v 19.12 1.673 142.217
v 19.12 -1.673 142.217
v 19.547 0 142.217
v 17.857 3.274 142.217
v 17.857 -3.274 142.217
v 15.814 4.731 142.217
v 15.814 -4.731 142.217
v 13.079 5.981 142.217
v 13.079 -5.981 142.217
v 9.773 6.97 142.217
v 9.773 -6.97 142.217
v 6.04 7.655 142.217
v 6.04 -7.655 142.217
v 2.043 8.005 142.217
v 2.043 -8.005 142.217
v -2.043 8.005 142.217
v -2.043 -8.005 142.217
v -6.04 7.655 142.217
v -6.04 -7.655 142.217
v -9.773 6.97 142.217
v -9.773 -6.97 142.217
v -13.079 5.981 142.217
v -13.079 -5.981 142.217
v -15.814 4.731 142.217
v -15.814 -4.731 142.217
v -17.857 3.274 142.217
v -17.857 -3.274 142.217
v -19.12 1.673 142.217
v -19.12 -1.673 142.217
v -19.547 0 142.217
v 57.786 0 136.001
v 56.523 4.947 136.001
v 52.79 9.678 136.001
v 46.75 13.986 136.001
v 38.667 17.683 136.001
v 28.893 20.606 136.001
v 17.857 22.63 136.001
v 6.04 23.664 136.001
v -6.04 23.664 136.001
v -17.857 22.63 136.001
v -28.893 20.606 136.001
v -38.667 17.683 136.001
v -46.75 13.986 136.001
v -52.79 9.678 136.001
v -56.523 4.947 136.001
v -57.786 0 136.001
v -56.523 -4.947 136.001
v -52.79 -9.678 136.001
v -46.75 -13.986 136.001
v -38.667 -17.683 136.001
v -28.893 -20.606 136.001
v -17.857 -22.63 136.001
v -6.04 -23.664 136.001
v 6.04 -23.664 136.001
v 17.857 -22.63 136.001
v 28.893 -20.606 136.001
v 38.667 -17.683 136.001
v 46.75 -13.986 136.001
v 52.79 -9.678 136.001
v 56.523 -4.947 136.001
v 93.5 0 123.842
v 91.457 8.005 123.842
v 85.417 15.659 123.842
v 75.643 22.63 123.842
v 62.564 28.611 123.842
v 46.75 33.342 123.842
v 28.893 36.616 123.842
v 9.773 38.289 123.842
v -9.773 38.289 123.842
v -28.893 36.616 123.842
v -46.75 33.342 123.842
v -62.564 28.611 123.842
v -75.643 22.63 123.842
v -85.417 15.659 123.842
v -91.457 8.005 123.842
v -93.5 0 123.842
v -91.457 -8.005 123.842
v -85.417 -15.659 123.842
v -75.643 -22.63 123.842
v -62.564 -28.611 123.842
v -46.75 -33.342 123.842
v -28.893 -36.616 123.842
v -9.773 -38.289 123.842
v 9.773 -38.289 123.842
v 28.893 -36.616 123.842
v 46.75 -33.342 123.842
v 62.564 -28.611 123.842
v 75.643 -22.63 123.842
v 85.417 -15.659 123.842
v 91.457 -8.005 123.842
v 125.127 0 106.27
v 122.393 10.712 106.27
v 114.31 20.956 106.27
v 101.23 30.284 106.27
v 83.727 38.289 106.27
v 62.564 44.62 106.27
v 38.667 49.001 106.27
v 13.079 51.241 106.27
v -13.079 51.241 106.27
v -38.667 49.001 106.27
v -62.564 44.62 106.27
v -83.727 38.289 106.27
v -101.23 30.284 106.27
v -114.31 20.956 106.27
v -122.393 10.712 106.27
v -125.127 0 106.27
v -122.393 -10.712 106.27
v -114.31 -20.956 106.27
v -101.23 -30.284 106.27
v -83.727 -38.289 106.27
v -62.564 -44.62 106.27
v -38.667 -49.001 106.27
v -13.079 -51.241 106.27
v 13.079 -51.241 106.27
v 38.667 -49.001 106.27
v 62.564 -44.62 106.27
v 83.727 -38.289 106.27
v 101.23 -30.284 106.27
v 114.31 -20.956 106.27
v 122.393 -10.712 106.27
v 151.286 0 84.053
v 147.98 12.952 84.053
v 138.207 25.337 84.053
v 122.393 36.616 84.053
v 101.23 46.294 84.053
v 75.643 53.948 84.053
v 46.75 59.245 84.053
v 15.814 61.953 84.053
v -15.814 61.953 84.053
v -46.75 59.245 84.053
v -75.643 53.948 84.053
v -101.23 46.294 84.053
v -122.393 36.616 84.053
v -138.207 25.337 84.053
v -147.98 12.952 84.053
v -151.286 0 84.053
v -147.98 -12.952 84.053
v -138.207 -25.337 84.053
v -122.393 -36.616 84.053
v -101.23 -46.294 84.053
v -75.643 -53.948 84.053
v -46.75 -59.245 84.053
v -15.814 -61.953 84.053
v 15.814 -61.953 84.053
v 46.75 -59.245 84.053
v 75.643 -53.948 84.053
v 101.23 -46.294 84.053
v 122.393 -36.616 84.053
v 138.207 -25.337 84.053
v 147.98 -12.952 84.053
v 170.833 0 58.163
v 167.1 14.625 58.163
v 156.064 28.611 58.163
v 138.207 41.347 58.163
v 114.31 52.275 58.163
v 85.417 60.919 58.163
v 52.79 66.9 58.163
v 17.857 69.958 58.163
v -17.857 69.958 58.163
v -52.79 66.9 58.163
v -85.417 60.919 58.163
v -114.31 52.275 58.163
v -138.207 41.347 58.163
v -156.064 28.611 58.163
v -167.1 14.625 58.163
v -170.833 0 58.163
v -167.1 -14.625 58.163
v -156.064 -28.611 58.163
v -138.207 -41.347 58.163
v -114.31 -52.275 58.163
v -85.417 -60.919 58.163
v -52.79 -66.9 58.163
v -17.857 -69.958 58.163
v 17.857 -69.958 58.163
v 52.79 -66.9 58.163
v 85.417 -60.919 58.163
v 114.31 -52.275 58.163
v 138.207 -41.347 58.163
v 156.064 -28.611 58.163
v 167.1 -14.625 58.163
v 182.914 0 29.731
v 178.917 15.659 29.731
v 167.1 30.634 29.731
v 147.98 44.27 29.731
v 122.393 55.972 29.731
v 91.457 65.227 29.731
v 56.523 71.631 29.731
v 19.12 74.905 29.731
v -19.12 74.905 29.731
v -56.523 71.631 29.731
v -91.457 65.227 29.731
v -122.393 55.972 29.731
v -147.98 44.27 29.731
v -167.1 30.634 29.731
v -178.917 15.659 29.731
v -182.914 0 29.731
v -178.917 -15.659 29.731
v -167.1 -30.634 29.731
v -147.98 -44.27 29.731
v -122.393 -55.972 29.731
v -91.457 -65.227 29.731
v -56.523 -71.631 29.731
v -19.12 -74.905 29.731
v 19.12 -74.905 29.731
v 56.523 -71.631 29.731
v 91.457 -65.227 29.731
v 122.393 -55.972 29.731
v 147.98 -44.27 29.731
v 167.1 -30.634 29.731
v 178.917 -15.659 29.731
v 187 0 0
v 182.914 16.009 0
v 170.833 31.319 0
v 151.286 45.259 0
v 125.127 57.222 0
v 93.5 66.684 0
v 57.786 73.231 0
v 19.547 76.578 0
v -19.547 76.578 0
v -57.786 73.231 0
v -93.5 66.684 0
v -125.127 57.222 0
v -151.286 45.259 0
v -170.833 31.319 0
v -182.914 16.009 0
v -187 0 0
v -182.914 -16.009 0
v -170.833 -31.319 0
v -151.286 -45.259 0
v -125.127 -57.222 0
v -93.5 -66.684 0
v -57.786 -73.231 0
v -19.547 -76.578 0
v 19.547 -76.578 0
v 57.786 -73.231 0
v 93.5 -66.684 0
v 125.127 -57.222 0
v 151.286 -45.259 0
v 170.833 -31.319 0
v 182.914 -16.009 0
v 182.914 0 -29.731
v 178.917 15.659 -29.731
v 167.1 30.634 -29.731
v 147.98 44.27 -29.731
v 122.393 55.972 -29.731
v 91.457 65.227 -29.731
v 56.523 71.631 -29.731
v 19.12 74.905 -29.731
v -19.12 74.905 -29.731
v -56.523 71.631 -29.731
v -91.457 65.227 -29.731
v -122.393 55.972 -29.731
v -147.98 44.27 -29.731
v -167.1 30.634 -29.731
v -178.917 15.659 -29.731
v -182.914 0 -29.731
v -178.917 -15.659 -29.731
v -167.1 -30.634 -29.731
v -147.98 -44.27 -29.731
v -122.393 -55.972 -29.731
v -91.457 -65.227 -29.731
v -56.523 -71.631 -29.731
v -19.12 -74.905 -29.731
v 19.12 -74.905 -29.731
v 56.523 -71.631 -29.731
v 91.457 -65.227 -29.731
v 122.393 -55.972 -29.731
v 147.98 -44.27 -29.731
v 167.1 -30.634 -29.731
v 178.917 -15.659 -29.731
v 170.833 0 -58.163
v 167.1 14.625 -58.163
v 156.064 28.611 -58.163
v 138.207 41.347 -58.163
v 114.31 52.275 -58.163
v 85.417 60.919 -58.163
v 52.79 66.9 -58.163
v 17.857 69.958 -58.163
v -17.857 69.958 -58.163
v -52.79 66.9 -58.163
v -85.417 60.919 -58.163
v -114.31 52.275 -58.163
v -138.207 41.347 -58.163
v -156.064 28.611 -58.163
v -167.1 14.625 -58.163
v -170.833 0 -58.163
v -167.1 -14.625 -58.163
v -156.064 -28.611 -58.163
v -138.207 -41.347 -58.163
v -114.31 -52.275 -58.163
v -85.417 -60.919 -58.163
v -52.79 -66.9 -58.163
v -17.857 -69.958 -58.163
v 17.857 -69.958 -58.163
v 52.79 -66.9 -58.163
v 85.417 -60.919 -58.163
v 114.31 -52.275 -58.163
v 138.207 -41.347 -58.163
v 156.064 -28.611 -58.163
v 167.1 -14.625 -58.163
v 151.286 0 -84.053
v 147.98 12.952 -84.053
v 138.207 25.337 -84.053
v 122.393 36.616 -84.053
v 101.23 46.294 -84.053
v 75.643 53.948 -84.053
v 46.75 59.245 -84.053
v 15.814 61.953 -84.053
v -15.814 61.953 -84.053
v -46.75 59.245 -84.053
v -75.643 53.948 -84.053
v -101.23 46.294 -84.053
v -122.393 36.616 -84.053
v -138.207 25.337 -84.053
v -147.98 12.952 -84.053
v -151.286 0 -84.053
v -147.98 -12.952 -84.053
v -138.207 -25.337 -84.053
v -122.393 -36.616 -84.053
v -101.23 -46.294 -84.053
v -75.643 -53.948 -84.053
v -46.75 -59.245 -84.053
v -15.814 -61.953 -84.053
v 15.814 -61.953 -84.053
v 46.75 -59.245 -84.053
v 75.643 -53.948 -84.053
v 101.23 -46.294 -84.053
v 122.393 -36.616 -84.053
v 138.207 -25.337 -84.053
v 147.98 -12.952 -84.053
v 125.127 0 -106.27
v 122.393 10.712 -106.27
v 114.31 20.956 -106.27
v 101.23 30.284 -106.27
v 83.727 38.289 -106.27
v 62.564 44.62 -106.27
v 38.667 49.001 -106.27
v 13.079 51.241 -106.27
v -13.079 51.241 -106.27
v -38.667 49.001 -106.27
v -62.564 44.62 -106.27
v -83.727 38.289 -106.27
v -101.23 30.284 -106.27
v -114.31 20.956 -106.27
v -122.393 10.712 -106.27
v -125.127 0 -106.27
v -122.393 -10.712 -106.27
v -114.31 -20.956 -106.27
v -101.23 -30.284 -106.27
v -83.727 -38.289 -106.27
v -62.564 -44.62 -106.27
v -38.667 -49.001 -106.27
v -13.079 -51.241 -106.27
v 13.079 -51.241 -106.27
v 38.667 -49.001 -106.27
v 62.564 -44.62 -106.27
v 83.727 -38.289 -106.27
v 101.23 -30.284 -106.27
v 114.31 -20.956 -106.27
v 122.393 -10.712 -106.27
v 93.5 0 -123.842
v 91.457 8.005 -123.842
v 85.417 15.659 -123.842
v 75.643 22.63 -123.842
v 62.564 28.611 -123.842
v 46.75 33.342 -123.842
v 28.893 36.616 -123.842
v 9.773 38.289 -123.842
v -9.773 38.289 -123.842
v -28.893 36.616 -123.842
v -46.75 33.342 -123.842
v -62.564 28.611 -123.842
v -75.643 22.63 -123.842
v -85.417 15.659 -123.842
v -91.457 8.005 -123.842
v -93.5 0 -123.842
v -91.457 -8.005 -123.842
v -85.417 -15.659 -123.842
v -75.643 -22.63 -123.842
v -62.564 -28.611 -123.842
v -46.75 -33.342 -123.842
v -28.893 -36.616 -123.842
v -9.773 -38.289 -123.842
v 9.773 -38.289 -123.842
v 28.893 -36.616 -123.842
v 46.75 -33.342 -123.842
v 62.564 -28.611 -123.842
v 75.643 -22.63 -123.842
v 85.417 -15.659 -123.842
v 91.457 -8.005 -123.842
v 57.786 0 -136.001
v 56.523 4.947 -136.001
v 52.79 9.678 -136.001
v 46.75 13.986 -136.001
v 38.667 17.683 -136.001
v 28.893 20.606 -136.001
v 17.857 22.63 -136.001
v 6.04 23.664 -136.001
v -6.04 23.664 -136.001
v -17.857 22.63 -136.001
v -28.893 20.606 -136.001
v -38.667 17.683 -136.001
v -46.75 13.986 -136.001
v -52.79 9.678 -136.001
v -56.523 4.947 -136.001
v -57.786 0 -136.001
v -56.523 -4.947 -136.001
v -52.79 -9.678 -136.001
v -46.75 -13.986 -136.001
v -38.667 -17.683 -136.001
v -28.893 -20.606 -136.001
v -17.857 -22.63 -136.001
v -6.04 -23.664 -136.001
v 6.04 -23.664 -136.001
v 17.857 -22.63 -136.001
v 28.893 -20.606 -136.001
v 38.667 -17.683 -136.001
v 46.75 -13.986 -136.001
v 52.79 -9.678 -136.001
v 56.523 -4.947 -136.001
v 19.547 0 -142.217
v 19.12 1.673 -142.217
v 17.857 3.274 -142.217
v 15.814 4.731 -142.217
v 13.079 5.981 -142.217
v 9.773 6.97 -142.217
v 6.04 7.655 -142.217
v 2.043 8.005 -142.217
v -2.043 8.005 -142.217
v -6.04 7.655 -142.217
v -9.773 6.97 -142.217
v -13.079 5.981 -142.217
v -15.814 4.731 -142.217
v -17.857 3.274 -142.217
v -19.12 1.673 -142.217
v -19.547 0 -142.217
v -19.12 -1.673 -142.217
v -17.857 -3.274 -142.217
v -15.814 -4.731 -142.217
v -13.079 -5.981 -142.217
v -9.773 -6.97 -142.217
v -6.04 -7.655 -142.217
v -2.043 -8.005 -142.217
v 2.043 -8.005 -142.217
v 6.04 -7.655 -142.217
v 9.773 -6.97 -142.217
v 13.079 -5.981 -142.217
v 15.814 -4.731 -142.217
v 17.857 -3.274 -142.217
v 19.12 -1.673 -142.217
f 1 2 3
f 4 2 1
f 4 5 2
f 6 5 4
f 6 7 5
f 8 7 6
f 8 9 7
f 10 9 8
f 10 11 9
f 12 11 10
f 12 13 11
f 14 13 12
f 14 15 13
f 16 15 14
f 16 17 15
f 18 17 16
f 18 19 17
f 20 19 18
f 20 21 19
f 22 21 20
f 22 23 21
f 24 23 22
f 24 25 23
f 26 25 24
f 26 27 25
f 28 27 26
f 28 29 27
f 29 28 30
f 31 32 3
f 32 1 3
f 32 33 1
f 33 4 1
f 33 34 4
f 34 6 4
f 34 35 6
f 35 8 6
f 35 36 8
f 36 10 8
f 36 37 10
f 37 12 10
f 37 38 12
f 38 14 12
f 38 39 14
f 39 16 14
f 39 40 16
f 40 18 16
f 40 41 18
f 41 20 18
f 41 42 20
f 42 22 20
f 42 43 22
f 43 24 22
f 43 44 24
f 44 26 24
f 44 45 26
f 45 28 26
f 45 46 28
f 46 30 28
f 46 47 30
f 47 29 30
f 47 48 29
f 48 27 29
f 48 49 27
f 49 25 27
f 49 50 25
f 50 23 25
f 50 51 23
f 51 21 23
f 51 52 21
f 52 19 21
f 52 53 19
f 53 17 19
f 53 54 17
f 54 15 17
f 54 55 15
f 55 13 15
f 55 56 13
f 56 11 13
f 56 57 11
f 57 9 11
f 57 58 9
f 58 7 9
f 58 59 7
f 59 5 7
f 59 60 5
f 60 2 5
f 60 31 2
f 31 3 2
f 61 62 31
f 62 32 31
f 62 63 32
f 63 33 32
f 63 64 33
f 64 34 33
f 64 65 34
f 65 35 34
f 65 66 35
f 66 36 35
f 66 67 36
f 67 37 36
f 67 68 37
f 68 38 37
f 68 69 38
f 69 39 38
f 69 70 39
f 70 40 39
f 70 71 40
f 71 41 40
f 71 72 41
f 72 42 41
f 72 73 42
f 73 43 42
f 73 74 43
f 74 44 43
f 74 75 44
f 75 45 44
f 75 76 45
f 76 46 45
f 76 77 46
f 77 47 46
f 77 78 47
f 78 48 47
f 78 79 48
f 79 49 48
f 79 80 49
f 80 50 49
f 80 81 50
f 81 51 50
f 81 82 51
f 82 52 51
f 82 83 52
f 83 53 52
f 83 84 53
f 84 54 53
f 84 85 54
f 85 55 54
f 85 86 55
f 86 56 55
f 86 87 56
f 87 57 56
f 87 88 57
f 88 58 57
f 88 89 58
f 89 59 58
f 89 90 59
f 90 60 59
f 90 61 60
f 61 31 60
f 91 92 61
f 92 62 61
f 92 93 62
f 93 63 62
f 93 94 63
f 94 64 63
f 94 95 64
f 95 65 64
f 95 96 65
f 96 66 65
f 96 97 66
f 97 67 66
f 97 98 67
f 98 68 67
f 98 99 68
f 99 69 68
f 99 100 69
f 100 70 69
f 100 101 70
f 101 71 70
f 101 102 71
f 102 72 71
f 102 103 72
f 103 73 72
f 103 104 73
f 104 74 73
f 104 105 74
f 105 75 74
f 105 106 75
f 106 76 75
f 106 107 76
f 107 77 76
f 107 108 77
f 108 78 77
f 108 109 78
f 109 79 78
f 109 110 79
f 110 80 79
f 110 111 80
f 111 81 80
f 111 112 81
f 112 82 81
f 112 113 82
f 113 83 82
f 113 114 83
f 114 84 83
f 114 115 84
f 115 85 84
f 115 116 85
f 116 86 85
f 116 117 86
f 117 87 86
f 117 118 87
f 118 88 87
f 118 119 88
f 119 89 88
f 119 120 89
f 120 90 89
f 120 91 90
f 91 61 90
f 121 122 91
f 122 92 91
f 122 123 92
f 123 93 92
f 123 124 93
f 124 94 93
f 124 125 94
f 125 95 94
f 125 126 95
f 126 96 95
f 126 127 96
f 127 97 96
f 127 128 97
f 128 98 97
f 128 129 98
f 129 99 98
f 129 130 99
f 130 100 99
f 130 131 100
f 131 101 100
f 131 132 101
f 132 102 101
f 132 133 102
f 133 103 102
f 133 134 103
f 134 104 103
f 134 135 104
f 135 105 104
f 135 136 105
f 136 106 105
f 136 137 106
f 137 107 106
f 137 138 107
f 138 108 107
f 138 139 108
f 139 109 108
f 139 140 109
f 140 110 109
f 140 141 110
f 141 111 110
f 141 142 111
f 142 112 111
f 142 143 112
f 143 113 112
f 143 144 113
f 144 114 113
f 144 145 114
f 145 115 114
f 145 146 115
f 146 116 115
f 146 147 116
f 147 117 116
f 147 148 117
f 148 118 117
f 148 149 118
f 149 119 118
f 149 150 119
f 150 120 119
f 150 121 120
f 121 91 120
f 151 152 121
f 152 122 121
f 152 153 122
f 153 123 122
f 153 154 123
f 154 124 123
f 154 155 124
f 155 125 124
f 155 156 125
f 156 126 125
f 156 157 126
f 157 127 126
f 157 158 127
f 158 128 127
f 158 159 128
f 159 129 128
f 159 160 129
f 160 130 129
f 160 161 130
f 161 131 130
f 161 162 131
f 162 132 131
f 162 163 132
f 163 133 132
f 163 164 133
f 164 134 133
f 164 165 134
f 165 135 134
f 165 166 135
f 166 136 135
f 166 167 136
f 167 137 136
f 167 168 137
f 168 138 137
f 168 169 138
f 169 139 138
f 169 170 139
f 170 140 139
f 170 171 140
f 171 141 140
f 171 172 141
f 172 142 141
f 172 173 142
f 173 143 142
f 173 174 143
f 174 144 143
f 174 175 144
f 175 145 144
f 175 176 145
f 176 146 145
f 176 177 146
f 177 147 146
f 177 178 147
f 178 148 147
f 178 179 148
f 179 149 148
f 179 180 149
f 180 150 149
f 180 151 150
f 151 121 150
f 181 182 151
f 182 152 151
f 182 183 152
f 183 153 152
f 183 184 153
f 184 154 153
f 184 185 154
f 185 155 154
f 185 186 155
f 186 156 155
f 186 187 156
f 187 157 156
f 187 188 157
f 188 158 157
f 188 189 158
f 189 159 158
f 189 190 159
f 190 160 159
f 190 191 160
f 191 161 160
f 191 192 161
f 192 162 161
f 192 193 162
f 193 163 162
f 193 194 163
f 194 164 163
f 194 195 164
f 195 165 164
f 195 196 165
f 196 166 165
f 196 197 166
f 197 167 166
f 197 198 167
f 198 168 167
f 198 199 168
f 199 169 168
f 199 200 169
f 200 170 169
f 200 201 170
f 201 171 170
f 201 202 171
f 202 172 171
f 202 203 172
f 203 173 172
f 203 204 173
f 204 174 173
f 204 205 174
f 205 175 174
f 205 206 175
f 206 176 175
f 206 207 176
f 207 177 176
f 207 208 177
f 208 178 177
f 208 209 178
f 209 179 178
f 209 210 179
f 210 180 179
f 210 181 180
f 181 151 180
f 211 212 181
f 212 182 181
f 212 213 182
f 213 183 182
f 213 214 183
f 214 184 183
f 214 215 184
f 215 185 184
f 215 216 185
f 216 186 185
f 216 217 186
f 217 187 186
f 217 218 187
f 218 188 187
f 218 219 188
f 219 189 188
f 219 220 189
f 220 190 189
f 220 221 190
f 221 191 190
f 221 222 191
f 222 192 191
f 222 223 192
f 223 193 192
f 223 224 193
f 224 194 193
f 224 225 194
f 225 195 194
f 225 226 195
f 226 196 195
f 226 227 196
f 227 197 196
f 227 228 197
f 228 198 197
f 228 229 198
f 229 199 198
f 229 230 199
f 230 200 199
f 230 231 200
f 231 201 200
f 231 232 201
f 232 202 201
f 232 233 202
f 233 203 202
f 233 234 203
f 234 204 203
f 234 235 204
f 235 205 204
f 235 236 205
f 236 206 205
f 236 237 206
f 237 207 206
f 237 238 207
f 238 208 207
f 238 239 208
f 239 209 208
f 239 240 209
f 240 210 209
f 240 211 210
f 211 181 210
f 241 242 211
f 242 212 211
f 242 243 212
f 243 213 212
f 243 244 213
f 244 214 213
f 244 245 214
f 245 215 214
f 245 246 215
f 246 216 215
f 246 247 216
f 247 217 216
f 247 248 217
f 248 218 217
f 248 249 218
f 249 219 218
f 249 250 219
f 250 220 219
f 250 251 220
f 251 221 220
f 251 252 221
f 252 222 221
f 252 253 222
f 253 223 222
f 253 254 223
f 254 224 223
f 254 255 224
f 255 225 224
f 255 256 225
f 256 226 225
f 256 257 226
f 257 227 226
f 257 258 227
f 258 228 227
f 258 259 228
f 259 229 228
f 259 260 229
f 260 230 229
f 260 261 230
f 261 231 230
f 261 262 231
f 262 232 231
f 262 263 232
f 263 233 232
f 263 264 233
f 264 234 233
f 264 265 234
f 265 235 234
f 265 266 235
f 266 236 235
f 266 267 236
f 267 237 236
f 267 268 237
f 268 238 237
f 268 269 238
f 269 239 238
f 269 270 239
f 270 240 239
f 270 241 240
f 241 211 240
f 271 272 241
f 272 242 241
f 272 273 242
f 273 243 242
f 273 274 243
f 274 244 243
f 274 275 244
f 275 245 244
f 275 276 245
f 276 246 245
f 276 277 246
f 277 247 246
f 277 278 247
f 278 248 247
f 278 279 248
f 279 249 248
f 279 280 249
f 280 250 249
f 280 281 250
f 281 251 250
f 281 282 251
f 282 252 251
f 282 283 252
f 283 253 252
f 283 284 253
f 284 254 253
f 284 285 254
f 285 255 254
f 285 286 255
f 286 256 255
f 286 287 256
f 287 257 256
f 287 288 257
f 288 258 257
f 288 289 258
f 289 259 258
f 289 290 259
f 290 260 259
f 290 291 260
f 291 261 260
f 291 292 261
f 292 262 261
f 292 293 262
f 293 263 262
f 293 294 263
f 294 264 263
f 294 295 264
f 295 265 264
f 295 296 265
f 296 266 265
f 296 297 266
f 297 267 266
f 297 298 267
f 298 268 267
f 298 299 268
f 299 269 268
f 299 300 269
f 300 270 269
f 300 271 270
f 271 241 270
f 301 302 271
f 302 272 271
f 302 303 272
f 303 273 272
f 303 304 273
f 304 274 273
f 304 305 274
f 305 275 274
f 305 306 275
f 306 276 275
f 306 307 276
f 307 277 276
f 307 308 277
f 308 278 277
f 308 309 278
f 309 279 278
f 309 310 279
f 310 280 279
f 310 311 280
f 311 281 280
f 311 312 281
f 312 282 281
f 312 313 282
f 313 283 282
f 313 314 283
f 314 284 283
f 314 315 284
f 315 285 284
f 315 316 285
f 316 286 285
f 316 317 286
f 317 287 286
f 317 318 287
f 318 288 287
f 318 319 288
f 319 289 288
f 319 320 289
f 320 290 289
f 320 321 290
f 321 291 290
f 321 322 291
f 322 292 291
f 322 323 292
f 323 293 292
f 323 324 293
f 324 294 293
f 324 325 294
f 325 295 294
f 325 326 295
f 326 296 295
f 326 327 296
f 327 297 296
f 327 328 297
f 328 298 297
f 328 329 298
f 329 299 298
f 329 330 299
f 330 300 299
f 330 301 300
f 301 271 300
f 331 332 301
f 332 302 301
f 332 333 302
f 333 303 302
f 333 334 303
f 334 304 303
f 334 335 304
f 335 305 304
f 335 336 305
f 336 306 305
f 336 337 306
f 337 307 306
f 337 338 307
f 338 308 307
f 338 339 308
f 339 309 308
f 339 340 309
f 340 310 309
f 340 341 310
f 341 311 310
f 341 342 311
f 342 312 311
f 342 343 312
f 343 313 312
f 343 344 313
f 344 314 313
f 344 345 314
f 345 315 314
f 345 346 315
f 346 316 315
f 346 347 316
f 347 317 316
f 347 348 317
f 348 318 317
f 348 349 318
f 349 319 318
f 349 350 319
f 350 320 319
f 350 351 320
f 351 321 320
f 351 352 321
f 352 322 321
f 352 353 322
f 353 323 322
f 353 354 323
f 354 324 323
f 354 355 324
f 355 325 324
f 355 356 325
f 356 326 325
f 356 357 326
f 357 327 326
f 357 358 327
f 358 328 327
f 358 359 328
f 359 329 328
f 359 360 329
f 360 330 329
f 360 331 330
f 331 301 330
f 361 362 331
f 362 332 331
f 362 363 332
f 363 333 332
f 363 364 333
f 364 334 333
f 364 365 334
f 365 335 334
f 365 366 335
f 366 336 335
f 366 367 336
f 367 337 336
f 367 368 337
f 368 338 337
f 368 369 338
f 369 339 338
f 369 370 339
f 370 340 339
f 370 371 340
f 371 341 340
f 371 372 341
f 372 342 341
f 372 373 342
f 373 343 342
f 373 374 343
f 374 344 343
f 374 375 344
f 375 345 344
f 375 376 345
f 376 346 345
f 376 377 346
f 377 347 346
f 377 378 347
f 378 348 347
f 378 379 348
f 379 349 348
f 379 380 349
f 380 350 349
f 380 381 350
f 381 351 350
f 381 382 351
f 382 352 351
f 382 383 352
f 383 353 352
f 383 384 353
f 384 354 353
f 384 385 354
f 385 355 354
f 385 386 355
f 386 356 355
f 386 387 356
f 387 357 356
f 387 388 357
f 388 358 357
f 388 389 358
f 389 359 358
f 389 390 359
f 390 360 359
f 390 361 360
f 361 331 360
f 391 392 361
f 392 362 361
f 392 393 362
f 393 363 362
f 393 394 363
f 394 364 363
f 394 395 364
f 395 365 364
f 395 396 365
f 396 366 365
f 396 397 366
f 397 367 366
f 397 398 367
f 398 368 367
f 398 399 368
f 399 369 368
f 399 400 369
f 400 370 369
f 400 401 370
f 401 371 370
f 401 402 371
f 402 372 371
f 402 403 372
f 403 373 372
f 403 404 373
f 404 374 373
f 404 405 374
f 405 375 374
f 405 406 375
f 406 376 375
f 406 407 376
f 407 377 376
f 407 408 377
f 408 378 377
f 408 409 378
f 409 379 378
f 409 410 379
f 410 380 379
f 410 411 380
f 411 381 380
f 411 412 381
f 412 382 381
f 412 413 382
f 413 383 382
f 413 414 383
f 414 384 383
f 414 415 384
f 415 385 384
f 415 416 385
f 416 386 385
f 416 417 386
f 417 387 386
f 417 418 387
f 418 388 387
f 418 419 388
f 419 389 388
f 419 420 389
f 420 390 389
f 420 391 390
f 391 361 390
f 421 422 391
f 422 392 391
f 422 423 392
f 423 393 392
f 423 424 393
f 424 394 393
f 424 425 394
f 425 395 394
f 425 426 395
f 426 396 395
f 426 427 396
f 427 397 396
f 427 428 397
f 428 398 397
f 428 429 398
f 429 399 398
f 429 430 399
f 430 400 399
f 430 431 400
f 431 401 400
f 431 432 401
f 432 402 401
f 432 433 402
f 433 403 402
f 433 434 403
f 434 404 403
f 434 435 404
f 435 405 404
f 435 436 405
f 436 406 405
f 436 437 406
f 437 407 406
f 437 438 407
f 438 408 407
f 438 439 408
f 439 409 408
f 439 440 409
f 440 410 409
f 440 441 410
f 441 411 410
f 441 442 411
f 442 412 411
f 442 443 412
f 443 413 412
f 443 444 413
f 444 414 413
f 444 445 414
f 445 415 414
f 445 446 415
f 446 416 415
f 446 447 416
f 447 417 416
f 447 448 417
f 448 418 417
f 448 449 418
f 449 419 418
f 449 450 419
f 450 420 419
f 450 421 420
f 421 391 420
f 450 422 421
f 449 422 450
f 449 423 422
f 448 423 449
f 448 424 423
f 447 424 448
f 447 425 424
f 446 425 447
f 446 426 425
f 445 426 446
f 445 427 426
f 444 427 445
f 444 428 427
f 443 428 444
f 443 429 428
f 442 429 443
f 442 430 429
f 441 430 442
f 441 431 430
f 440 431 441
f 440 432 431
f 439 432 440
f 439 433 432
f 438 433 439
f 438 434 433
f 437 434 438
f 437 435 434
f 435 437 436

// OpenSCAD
// Generated by SolidPython 1.0.1 on 2020-07-29 00:46:52


scale(v = [17, 7, 13]) {
	sphere(r = 11);
}
/***********************************************
*********      SolidPython code:      **********
************************************************
 
# import packages: SolidPython
from solid import *
from solid.utils import *
from itertools import chain, combinations, permutations


class Resize:

    def __init__(self, scad_file):
        self.scad_file = scad_file
        #self.scad_file = import_scad(scad_file)
        # cone/cylinder param:
        self.r1 = 0
        self.r2 = 0
        self.h = 0
        # rectangular prism param:
        self.w = 0
        self.l = 0
        # ellipse param:
        self.r = 0

    # import OpenScad code (file name corresponds to shape)


    # classify shape + parameters
    def assign(self, param1, param2, param3):
        if self.scad_file == 'cone.scad':
            self.r1 = param1
            self.r2 = param2
            self.h = param3
        elif self.scad_file == 'cylinder.scad':
            self.r1 = param1
            self.r2 = param2
            self.h = param3
        elif self.scad_file == 'rectangularPrism.scad':
            self.h = param1
            self.l = param2
            self.w = param3
        else:
            self.r = param1
            self.h = param2

    # resize parameters
    def iterate(self):
        x = range(3, 20, 2)
        i = 1
        if self.scad_file == 'cone.scad':
            tempList = list(permutations(x, 2))
            for temp in tempList:
                param1 = temp[0]
                param2 = temp[1]
                filepath = 'produced_scad_files/' + 'cone' + str(param1) + '_' + str(param2) + '_' + '.scad'
                scad_render_to_file(cylinder(h=param1, r1=param2, r2=0), filepath)

        elif self.scad_file == 'cylinder.scad':
            tempList = list(permutations(x, 3))
            for temp in tempList:
                param1 = temp[0]
                param2 = temp[1]
                filepath = 'produced_scad_files/' + 'cylinder' + str(param1) + '_' + str(param2) + '_' + '.scad'
                scad_render_to_file(cylinder(h=param1, r1=param2, r2=param2), filepath)

        elif self.scad_file == 'rectangularPrism.scad':
            tempList = list(permutations(x, 3))
            for temp in tempList:
                param1 = temp[0]
                param2 = temp[1]
                param3 = temp[2]
                filepath = 'produced_scad_files/' + 'rectangularPrism' + str(param1) + '_' + str(param2) + '_' + str(
                    param3) + '.scad'
                scad_render_to_file(cube(size=(param1, param2, param3)), filepath)

        elif self.scad_file == 'ellipse.scad':
            tempList = list(permutations(x, 4))
            for temp in tempList:
                param1 = temp[0]
                param2 = temp[1]
                param3 = temp[2]
                param4 = temp[3]
                filepath = 'produced_scad_files/' + 'ellipse' + str(param1) + '_' + str(param2) + '_' + str(param3) + '_' + str(param4) + '.scad'
                scad_render_to_file(scale([param1, param2, param3])(sphere(r=param4)), filepath)

    def render_to_scadfile(self):
        scad_render_to_file(scad, 'example.scad') 
 
************************************************/
